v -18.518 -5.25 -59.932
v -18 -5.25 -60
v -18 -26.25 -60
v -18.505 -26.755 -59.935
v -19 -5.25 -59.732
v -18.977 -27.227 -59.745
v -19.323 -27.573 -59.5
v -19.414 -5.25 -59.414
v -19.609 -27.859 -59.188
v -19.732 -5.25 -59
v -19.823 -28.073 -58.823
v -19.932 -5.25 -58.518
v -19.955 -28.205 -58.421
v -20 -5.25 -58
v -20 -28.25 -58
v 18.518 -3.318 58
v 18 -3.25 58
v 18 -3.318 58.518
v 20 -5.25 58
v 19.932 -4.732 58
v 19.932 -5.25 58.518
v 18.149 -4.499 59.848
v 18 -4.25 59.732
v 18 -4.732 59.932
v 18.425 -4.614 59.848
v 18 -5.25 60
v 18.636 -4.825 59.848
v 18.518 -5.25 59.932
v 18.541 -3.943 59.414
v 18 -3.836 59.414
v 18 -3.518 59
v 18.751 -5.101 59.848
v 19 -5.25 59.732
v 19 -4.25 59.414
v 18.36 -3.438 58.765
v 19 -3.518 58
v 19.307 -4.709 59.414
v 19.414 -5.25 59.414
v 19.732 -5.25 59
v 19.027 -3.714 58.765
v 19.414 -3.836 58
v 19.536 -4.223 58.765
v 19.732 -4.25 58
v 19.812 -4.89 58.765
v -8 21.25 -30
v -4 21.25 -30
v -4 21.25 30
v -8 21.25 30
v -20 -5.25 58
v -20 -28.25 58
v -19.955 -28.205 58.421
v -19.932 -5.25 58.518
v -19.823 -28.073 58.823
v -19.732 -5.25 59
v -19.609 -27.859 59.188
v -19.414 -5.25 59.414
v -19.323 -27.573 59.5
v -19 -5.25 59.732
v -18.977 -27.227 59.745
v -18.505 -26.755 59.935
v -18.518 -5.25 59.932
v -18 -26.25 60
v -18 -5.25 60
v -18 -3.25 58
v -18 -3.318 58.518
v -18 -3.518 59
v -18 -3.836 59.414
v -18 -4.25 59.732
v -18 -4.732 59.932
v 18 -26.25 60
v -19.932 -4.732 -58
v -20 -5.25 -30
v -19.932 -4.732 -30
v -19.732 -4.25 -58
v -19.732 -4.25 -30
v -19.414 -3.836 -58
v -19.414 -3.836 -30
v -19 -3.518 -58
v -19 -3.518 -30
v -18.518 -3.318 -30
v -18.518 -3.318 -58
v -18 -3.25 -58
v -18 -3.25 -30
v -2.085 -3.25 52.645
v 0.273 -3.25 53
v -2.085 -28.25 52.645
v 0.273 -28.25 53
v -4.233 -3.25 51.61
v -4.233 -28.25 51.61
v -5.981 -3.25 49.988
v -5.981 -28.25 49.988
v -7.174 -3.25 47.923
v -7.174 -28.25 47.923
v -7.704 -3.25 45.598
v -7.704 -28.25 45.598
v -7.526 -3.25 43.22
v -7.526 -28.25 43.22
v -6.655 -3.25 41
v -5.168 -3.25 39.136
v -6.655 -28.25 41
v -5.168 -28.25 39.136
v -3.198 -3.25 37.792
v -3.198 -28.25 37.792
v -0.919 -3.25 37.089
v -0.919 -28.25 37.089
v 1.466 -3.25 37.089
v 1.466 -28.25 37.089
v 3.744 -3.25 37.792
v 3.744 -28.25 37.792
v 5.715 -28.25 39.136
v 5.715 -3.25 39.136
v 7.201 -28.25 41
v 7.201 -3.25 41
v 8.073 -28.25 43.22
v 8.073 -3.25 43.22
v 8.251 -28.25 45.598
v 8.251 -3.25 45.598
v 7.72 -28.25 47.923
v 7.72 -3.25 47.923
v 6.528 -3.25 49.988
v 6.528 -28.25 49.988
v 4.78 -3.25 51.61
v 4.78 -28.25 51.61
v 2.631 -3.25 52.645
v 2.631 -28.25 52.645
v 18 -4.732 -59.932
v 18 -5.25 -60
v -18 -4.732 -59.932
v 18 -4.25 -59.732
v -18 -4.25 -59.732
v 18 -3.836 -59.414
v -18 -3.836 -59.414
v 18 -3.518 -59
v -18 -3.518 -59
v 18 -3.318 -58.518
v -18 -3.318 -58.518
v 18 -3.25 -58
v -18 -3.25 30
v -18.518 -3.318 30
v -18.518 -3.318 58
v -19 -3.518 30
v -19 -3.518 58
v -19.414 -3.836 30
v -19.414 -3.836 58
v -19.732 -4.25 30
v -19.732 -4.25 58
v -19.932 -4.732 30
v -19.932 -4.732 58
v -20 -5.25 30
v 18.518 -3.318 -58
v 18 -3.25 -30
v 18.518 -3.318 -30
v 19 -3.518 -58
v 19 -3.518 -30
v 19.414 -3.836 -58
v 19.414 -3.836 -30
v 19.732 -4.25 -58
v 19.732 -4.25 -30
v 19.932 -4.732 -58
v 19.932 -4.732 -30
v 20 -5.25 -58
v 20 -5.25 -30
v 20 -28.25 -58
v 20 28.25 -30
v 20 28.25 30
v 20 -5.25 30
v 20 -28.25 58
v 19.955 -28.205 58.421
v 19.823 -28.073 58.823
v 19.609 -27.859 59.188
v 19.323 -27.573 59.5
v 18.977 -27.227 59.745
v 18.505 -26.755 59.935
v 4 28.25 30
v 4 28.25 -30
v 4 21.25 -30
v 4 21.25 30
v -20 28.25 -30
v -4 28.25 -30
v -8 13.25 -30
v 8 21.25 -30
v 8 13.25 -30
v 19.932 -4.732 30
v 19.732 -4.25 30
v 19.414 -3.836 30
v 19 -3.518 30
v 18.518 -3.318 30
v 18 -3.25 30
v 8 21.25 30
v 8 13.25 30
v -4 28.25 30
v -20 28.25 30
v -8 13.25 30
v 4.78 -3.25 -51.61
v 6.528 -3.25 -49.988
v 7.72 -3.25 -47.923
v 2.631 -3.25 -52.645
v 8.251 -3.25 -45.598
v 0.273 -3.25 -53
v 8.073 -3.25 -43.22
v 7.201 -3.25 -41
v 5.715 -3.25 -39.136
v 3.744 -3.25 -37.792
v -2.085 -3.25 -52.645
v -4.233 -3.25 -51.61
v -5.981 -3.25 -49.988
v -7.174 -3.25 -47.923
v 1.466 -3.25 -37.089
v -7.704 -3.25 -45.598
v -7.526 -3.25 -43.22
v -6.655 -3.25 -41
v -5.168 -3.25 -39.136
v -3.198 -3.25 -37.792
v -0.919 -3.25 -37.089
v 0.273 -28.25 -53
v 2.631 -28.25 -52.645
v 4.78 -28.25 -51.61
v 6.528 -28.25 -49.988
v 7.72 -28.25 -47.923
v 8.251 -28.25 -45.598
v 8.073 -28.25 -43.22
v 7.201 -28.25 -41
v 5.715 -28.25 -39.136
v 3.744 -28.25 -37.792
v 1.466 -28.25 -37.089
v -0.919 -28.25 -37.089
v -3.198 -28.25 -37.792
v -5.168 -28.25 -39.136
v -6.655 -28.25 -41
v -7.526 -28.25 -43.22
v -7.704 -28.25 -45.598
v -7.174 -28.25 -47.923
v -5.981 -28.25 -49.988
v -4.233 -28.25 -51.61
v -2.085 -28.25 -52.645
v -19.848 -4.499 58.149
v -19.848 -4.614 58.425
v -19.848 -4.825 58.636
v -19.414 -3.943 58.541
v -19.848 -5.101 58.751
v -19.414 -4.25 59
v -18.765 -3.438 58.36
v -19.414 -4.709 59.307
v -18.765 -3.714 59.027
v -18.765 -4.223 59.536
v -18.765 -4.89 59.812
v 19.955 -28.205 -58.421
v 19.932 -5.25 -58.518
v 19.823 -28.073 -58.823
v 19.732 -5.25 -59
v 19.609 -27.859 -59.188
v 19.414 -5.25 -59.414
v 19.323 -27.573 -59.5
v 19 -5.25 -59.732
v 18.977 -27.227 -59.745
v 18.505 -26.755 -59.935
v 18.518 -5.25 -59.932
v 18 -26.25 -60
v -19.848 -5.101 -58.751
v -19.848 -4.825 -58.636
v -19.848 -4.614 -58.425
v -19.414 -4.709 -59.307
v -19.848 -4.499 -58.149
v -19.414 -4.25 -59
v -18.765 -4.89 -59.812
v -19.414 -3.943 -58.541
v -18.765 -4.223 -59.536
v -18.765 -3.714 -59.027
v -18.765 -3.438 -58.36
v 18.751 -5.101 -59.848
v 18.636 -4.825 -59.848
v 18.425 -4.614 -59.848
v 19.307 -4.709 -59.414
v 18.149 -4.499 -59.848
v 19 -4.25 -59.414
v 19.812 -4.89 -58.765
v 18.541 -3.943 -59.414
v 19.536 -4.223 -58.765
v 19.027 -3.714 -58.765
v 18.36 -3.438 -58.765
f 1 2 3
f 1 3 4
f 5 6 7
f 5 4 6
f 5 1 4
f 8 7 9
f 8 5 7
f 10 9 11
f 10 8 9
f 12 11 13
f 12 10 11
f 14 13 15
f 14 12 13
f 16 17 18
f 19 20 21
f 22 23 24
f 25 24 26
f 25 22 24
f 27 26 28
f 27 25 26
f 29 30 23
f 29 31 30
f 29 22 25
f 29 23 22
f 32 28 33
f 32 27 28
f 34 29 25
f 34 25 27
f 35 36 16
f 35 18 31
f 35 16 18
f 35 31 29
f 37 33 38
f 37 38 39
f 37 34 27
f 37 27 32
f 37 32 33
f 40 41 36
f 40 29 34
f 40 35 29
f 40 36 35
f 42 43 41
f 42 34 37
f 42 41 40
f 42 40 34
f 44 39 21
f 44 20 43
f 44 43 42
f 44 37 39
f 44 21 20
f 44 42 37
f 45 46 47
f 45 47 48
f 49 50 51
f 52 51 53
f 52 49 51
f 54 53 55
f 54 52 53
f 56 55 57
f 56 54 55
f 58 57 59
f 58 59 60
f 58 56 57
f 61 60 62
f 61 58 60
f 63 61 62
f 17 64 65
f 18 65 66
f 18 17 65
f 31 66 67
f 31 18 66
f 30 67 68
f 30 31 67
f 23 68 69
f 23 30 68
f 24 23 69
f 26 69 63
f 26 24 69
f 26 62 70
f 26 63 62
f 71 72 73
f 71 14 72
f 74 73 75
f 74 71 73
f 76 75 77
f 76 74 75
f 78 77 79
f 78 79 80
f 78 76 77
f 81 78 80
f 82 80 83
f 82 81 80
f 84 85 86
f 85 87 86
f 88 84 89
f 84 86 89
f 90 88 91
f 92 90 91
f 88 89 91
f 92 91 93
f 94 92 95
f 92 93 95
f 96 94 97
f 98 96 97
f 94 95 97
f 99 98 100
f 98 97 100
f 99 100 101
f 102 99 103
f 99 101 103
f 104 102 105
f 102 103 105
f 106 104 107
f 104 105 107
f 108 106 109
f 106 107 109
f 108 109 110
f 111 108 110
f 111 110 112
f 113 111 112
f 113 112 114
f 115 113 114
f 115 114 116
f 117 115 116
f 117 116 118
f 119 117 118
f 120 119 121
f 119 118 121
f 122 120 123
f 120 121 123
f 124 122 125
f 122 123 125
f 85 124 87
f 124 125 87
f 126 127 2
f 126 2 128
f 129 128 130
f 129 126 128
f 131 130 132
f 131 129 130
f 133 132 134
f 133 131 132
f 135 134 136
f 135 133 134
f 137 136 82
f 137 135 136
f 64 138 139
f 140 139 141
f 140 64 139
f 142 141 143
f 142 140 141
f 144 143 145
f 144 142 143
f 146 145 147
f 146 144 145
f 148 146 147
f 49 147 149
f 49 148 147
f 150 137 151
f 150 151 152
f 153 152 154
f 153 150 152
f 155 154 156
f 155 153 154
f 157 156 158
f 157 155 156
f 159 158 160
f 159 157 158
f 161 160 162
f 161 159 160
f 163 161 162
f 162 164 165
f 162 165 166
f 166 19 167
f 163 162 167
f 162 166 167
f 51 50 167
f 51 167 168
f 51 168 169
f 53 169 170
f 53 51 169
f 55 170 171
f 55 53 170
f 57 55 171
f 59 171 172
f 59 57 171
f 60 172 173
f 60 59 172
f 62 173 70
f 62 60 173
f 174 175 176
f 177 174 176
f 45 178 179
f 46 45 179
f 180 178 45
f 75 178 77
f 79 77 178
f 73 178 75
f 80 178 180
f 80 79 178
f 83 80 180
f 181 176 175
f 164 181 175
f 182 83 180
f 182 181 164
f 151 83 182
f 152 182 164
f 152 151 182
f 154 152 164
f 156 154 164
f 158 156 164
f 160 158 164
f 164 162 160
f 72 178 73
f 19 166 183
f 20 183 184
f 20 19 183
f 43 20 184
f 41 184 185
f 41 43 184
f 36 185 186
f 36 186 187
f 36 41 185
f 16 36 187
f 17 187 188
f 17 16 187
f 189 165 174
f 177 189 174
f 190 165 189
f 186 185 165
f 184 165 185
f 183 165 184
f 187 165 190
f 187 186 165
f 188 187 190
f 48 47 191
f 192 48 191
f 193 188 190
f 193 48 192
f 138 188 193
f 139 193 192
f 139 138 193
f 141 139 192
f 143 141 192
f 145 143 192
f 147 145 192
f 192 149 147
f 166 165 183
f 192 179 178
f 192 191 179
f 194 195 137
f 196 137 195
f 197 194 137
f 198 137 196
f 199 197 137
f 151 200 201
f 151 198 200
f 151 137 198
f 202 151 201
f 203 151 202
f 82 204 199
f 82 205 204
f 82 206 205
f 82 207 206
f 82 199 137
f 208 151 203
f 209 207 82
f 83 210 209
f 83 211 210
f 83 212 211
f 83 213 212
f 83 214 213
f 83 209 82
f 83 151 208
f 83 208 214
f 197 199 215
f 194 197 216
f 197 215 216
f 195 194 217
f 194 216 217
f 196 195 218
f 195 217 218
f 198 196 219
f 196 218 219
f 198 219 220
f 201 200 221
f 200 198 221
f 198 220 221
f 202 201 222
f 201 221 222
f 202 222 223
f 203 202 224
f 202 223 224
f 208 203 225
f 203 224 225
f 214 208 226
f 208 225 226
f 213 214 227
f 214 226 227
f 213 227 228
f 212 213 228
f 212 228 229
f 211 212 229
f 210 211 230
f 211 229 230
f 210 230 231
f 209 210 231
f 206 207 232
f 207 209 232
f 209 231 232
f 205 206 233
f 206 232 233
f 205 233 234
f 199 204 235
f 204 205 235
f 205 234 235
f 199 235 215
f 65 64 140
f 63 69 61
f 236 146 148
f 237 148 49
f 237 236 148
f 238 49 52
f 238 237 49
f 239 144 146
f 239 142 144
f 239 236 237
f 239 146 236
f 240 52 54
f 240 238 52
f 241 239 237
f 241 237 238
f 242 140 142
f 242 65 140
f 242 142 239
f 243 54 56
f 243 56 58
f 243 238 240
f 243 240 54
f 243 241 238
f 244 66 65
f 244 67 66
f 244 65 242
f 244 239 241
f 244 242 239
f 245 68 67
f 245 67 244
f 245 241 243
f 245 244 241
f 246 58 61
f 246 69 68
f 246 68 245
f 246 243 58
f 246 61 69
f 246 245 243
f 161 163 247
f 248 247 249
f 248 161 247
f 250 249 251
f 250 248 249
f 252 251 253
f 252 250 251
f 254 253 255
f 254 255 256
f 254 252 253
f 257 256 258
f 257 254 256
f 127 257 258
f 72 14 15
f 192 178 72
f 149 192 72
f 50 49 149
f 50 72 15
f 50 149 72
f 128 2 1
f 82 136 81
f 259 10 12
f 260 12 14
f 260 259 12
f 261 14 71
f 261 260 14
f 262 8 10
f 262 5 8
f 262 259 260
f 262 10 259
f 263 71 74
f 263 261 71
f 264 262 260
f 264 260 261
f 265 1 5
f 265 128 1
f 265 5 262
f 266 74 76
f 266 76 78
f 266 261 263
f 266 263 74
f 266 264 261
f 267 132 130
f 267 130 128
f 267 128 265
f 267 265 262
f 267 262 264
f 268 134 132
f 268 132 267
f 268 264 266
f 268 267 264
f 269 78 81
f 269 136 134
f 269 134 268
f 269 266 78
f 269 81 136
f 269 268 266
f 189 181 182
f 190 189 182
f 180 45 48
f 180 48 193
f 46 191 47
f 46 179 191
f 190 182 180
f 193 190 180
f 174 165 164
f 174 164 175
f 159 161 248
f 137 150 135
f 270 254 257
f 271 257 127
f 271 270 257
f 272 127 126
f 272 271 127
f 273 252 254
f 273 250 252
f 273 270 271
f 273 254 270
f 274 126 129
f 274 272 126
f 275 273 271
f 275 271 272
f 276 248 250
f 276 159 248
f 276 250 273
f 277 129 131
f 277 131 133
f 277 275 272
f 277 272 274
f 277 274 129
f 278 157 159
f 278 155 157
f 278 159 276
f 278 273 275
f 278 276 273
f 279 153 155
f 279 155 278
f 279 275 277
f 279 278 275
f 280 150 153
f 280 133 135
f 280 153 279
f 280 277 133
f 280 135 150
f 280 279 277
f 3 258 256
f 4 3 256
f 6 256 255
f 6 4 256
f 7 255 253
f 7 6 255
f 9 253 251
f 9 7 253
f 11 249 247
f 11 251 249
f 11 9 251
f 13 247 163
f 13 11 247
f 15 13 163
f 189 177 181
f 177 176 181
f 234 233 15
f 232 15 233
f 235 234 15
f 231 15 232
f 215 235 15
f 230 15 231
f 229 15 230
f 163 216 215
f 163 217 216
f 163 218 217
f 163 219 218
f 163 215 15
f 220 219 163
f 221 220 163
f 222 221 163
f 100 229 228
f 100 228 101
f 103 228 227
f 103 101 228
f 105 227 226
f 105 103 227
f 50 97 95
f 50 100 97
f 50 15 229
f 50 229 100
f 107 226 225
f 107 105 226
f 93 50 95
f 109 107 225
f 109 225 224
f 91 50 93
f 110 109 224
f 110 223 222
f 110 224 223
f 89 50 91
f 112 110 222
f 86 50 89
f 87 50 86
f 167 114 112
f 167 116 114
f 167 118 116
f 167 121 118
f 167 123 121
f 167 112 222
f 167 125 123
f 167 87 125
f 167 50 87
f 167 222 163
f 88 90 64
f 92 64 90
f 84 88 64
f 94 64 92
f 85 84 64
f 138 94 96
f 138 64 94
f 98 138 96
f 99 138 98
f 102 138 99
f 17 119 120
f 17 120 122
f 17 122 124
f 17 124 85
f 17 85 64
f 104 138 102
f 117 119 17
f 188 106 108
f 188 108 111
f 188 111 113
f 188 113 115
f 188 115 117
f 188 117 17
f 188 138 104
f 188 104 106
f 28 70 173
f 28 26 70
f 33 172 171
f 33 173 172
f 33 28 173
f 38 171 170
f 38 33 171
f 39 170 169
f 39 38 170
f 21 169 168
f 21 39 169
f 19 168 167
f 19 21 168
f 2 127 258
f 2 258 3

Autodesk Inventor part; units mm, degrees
ref_plane "YZ Plane" through (0, 0, 0) normal (1, 0, 0) x (0, 1, 0)
ref_plane "XZ Plane" through (0, 0, 0) normal (0, 1, 0) x (-1, 0, 0)
ref_plane "XY Plane" through (0, 0, 0) normal (0, 0, 1) x (1, 0, 0)
sketch "Esquisse1" plane through (0, 0, 0) normal (0, 1, 0) x (-1, 0, 0)
  line L0 (-20, 30) -> (20, 30)
  line L1 (20, 30) -> (20, -30)
  line L2 (20, -30) -> (-20, -30)
  line L3 (-20, -30) -> (-20, 30)
  line L4 (-20, 30) -> (20, -30) construction
  line L5 (20, 30) -> (-20, -30) construction
  point P0 (0, 0)
  dimension "d0" = 40
  dimension "d1" = 60
extrude "Extrusion1" add sketch "Esquisse1" along normal mid plane 56.5
sketch "Esquisse2" plane through (20, 28.25, -30) normal (0, 0, -1) x (-1, 0, 0)
  line L0 (0, 0) -> (40, 0) projected
  line L1 (16, 0) -> (16, -7)
  line L2 (16, -7) -> (12, -7)
  line L3 (12, -7) -> (12, -15)
  line L4 (20, 0.6313) -> (20, -19.069)
  line L5 (12, -15) -> (20, -15)
  line L6 (24, 0) -> (24, -7)
  line L7 (24, -7) -> (28, -7)
  line L8 (28, -7) -> (28, -15)
  line L9 (28, -15) -> (20, -15)
  point P0 (20, -28.25)
  point P1 (20, 0)
  dimension "d4" = 7
  dimension "d5" = 4
  dimension "d6" = 4
  dimension "d7" = 8
extrude "Extrusion2" cut sketch "Esquisse2" against normal through all
sketch "Esquisse3" plane through (-20, -28.25, 30) normal (0, 0, 1) x (1, 0, 0)
  line L0 (40, 0) -> (40, 56.5) projected
  line L1 (0, 25) -> (40, 25)
  line L2 (40, 25) -> (40, 0)
  line L3 (40, 0) -> (0, 0)
  line L4 (0, 0) -> (0, 25)
  line L5 (0, 25) -> (40, 0) construction
  line L6 (40, 25) -> (0, 0) construction
  point P0 (20, 28.25)
  point P1 (20, 12.5)
  dimension "d10" = 25
extrude "Extrusion3" add sketch "Esquisse3" along normal blind 30
fillet "Congé1" radius 2 6 edges at (20, -3.25, 45) (20, -15.75, 60) (0, -3.25, 60) (-20, -3.25, 45) (-20, -15.75, 60) (0, -28.25, 60)
sketch "Esquisse4" plane through (-18, -3.25, 30) normal (0, 1, 0) x (1, 0, 0)
  line L0 (0, -28) -> (0, 0) projected
  line L1 (36, -28) -> (0, -28) projected
  line L2 (36, 0) -> (36, -28) projected
  line L3 (0, 0) -> (36, 0) projected
  line L4 (46, 30) -> (-10, 30) projected
  point P0 (18, 30)
  point P1 (18.2732, -15)
  dimension "d21" = 45
hole "Perçage1" at (0.2732, -3.25, 45) direction (0, -1, 0) diameter 16 end through all
mirror "Mise en miroir2" about plane through (0, 0, 0) normal (0, 0, 1) of "Extrusion3", "Congé1", "Perçage1"
properties part number "SupportFrein"
